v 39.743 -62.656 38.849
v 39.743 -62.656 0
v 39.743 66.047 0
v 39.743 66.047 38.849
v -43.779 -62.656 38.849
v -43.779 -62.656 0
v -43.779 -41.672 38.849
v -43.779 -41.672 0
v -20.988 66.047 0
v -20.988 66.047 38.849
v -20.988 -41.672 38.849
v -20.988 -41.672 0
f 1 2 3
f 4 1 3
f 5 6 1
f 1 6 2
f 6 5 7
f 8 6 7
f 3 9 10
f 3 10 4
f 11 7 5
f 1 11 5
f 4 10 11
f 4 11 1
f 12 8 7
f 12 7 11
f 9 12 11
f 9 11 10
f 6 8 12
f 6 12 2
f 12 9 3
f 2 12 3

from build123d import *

# Parameters (mm, degrees)
F0_W      = 60.731009
F0_H      = 107.71951
F0_W_2    = 22.791378
F0_H_2    = 20.984024
F1_DEPTH  = 38.848586
F1_FACE_W = 20.984024
F1_FACE_H = 38.848586
F2_DEPTH  = 27.409891
F3_W      = 20.984024
F3_H      = 38.848586
F4_DEPTH  = 31.743571


with BuildPart() as f1:
    # F0 (on Top) → F1 (new body)
    with BuildSketch(Plane.XY):
        with Locations((9.377531, 12.187466)):
            Rectangle(F0_W, F0_H)
        with Locations((-32.383662, -52.164301)):
            Rectangle(F0_W_2, F0_H_2)
        with Locations((9.377531, -52.164301)):
            Rectangle(F0_W, F0_H_2)
    extrude(amount=F1_DEPTH)

    # F1_face (on face) → F2 (join)
    with BuildSketch(Plane(origin=(-43.779351, -52.164301, 19.424293), x_dir=(0, -1, 0), z_dir=(-1, 0, 0))):
        Rectangle(F1_FACE_W, F1_FACE_H)
    extrude(amount=-F2_DEPTH)

    # F3 (on face) → F4 (join)
    with BuildSketch(Plane(origin=(-43.779351, 0, 0), x_dir=(0, -1, 0), z_dir=(-1, 0, 0))):
        with Locations((52.164301, 19.424293)):
            Rectangle(F3_W, F3_H)
    extrude(amount=-F4_DEPTH)


solid = f1.part
